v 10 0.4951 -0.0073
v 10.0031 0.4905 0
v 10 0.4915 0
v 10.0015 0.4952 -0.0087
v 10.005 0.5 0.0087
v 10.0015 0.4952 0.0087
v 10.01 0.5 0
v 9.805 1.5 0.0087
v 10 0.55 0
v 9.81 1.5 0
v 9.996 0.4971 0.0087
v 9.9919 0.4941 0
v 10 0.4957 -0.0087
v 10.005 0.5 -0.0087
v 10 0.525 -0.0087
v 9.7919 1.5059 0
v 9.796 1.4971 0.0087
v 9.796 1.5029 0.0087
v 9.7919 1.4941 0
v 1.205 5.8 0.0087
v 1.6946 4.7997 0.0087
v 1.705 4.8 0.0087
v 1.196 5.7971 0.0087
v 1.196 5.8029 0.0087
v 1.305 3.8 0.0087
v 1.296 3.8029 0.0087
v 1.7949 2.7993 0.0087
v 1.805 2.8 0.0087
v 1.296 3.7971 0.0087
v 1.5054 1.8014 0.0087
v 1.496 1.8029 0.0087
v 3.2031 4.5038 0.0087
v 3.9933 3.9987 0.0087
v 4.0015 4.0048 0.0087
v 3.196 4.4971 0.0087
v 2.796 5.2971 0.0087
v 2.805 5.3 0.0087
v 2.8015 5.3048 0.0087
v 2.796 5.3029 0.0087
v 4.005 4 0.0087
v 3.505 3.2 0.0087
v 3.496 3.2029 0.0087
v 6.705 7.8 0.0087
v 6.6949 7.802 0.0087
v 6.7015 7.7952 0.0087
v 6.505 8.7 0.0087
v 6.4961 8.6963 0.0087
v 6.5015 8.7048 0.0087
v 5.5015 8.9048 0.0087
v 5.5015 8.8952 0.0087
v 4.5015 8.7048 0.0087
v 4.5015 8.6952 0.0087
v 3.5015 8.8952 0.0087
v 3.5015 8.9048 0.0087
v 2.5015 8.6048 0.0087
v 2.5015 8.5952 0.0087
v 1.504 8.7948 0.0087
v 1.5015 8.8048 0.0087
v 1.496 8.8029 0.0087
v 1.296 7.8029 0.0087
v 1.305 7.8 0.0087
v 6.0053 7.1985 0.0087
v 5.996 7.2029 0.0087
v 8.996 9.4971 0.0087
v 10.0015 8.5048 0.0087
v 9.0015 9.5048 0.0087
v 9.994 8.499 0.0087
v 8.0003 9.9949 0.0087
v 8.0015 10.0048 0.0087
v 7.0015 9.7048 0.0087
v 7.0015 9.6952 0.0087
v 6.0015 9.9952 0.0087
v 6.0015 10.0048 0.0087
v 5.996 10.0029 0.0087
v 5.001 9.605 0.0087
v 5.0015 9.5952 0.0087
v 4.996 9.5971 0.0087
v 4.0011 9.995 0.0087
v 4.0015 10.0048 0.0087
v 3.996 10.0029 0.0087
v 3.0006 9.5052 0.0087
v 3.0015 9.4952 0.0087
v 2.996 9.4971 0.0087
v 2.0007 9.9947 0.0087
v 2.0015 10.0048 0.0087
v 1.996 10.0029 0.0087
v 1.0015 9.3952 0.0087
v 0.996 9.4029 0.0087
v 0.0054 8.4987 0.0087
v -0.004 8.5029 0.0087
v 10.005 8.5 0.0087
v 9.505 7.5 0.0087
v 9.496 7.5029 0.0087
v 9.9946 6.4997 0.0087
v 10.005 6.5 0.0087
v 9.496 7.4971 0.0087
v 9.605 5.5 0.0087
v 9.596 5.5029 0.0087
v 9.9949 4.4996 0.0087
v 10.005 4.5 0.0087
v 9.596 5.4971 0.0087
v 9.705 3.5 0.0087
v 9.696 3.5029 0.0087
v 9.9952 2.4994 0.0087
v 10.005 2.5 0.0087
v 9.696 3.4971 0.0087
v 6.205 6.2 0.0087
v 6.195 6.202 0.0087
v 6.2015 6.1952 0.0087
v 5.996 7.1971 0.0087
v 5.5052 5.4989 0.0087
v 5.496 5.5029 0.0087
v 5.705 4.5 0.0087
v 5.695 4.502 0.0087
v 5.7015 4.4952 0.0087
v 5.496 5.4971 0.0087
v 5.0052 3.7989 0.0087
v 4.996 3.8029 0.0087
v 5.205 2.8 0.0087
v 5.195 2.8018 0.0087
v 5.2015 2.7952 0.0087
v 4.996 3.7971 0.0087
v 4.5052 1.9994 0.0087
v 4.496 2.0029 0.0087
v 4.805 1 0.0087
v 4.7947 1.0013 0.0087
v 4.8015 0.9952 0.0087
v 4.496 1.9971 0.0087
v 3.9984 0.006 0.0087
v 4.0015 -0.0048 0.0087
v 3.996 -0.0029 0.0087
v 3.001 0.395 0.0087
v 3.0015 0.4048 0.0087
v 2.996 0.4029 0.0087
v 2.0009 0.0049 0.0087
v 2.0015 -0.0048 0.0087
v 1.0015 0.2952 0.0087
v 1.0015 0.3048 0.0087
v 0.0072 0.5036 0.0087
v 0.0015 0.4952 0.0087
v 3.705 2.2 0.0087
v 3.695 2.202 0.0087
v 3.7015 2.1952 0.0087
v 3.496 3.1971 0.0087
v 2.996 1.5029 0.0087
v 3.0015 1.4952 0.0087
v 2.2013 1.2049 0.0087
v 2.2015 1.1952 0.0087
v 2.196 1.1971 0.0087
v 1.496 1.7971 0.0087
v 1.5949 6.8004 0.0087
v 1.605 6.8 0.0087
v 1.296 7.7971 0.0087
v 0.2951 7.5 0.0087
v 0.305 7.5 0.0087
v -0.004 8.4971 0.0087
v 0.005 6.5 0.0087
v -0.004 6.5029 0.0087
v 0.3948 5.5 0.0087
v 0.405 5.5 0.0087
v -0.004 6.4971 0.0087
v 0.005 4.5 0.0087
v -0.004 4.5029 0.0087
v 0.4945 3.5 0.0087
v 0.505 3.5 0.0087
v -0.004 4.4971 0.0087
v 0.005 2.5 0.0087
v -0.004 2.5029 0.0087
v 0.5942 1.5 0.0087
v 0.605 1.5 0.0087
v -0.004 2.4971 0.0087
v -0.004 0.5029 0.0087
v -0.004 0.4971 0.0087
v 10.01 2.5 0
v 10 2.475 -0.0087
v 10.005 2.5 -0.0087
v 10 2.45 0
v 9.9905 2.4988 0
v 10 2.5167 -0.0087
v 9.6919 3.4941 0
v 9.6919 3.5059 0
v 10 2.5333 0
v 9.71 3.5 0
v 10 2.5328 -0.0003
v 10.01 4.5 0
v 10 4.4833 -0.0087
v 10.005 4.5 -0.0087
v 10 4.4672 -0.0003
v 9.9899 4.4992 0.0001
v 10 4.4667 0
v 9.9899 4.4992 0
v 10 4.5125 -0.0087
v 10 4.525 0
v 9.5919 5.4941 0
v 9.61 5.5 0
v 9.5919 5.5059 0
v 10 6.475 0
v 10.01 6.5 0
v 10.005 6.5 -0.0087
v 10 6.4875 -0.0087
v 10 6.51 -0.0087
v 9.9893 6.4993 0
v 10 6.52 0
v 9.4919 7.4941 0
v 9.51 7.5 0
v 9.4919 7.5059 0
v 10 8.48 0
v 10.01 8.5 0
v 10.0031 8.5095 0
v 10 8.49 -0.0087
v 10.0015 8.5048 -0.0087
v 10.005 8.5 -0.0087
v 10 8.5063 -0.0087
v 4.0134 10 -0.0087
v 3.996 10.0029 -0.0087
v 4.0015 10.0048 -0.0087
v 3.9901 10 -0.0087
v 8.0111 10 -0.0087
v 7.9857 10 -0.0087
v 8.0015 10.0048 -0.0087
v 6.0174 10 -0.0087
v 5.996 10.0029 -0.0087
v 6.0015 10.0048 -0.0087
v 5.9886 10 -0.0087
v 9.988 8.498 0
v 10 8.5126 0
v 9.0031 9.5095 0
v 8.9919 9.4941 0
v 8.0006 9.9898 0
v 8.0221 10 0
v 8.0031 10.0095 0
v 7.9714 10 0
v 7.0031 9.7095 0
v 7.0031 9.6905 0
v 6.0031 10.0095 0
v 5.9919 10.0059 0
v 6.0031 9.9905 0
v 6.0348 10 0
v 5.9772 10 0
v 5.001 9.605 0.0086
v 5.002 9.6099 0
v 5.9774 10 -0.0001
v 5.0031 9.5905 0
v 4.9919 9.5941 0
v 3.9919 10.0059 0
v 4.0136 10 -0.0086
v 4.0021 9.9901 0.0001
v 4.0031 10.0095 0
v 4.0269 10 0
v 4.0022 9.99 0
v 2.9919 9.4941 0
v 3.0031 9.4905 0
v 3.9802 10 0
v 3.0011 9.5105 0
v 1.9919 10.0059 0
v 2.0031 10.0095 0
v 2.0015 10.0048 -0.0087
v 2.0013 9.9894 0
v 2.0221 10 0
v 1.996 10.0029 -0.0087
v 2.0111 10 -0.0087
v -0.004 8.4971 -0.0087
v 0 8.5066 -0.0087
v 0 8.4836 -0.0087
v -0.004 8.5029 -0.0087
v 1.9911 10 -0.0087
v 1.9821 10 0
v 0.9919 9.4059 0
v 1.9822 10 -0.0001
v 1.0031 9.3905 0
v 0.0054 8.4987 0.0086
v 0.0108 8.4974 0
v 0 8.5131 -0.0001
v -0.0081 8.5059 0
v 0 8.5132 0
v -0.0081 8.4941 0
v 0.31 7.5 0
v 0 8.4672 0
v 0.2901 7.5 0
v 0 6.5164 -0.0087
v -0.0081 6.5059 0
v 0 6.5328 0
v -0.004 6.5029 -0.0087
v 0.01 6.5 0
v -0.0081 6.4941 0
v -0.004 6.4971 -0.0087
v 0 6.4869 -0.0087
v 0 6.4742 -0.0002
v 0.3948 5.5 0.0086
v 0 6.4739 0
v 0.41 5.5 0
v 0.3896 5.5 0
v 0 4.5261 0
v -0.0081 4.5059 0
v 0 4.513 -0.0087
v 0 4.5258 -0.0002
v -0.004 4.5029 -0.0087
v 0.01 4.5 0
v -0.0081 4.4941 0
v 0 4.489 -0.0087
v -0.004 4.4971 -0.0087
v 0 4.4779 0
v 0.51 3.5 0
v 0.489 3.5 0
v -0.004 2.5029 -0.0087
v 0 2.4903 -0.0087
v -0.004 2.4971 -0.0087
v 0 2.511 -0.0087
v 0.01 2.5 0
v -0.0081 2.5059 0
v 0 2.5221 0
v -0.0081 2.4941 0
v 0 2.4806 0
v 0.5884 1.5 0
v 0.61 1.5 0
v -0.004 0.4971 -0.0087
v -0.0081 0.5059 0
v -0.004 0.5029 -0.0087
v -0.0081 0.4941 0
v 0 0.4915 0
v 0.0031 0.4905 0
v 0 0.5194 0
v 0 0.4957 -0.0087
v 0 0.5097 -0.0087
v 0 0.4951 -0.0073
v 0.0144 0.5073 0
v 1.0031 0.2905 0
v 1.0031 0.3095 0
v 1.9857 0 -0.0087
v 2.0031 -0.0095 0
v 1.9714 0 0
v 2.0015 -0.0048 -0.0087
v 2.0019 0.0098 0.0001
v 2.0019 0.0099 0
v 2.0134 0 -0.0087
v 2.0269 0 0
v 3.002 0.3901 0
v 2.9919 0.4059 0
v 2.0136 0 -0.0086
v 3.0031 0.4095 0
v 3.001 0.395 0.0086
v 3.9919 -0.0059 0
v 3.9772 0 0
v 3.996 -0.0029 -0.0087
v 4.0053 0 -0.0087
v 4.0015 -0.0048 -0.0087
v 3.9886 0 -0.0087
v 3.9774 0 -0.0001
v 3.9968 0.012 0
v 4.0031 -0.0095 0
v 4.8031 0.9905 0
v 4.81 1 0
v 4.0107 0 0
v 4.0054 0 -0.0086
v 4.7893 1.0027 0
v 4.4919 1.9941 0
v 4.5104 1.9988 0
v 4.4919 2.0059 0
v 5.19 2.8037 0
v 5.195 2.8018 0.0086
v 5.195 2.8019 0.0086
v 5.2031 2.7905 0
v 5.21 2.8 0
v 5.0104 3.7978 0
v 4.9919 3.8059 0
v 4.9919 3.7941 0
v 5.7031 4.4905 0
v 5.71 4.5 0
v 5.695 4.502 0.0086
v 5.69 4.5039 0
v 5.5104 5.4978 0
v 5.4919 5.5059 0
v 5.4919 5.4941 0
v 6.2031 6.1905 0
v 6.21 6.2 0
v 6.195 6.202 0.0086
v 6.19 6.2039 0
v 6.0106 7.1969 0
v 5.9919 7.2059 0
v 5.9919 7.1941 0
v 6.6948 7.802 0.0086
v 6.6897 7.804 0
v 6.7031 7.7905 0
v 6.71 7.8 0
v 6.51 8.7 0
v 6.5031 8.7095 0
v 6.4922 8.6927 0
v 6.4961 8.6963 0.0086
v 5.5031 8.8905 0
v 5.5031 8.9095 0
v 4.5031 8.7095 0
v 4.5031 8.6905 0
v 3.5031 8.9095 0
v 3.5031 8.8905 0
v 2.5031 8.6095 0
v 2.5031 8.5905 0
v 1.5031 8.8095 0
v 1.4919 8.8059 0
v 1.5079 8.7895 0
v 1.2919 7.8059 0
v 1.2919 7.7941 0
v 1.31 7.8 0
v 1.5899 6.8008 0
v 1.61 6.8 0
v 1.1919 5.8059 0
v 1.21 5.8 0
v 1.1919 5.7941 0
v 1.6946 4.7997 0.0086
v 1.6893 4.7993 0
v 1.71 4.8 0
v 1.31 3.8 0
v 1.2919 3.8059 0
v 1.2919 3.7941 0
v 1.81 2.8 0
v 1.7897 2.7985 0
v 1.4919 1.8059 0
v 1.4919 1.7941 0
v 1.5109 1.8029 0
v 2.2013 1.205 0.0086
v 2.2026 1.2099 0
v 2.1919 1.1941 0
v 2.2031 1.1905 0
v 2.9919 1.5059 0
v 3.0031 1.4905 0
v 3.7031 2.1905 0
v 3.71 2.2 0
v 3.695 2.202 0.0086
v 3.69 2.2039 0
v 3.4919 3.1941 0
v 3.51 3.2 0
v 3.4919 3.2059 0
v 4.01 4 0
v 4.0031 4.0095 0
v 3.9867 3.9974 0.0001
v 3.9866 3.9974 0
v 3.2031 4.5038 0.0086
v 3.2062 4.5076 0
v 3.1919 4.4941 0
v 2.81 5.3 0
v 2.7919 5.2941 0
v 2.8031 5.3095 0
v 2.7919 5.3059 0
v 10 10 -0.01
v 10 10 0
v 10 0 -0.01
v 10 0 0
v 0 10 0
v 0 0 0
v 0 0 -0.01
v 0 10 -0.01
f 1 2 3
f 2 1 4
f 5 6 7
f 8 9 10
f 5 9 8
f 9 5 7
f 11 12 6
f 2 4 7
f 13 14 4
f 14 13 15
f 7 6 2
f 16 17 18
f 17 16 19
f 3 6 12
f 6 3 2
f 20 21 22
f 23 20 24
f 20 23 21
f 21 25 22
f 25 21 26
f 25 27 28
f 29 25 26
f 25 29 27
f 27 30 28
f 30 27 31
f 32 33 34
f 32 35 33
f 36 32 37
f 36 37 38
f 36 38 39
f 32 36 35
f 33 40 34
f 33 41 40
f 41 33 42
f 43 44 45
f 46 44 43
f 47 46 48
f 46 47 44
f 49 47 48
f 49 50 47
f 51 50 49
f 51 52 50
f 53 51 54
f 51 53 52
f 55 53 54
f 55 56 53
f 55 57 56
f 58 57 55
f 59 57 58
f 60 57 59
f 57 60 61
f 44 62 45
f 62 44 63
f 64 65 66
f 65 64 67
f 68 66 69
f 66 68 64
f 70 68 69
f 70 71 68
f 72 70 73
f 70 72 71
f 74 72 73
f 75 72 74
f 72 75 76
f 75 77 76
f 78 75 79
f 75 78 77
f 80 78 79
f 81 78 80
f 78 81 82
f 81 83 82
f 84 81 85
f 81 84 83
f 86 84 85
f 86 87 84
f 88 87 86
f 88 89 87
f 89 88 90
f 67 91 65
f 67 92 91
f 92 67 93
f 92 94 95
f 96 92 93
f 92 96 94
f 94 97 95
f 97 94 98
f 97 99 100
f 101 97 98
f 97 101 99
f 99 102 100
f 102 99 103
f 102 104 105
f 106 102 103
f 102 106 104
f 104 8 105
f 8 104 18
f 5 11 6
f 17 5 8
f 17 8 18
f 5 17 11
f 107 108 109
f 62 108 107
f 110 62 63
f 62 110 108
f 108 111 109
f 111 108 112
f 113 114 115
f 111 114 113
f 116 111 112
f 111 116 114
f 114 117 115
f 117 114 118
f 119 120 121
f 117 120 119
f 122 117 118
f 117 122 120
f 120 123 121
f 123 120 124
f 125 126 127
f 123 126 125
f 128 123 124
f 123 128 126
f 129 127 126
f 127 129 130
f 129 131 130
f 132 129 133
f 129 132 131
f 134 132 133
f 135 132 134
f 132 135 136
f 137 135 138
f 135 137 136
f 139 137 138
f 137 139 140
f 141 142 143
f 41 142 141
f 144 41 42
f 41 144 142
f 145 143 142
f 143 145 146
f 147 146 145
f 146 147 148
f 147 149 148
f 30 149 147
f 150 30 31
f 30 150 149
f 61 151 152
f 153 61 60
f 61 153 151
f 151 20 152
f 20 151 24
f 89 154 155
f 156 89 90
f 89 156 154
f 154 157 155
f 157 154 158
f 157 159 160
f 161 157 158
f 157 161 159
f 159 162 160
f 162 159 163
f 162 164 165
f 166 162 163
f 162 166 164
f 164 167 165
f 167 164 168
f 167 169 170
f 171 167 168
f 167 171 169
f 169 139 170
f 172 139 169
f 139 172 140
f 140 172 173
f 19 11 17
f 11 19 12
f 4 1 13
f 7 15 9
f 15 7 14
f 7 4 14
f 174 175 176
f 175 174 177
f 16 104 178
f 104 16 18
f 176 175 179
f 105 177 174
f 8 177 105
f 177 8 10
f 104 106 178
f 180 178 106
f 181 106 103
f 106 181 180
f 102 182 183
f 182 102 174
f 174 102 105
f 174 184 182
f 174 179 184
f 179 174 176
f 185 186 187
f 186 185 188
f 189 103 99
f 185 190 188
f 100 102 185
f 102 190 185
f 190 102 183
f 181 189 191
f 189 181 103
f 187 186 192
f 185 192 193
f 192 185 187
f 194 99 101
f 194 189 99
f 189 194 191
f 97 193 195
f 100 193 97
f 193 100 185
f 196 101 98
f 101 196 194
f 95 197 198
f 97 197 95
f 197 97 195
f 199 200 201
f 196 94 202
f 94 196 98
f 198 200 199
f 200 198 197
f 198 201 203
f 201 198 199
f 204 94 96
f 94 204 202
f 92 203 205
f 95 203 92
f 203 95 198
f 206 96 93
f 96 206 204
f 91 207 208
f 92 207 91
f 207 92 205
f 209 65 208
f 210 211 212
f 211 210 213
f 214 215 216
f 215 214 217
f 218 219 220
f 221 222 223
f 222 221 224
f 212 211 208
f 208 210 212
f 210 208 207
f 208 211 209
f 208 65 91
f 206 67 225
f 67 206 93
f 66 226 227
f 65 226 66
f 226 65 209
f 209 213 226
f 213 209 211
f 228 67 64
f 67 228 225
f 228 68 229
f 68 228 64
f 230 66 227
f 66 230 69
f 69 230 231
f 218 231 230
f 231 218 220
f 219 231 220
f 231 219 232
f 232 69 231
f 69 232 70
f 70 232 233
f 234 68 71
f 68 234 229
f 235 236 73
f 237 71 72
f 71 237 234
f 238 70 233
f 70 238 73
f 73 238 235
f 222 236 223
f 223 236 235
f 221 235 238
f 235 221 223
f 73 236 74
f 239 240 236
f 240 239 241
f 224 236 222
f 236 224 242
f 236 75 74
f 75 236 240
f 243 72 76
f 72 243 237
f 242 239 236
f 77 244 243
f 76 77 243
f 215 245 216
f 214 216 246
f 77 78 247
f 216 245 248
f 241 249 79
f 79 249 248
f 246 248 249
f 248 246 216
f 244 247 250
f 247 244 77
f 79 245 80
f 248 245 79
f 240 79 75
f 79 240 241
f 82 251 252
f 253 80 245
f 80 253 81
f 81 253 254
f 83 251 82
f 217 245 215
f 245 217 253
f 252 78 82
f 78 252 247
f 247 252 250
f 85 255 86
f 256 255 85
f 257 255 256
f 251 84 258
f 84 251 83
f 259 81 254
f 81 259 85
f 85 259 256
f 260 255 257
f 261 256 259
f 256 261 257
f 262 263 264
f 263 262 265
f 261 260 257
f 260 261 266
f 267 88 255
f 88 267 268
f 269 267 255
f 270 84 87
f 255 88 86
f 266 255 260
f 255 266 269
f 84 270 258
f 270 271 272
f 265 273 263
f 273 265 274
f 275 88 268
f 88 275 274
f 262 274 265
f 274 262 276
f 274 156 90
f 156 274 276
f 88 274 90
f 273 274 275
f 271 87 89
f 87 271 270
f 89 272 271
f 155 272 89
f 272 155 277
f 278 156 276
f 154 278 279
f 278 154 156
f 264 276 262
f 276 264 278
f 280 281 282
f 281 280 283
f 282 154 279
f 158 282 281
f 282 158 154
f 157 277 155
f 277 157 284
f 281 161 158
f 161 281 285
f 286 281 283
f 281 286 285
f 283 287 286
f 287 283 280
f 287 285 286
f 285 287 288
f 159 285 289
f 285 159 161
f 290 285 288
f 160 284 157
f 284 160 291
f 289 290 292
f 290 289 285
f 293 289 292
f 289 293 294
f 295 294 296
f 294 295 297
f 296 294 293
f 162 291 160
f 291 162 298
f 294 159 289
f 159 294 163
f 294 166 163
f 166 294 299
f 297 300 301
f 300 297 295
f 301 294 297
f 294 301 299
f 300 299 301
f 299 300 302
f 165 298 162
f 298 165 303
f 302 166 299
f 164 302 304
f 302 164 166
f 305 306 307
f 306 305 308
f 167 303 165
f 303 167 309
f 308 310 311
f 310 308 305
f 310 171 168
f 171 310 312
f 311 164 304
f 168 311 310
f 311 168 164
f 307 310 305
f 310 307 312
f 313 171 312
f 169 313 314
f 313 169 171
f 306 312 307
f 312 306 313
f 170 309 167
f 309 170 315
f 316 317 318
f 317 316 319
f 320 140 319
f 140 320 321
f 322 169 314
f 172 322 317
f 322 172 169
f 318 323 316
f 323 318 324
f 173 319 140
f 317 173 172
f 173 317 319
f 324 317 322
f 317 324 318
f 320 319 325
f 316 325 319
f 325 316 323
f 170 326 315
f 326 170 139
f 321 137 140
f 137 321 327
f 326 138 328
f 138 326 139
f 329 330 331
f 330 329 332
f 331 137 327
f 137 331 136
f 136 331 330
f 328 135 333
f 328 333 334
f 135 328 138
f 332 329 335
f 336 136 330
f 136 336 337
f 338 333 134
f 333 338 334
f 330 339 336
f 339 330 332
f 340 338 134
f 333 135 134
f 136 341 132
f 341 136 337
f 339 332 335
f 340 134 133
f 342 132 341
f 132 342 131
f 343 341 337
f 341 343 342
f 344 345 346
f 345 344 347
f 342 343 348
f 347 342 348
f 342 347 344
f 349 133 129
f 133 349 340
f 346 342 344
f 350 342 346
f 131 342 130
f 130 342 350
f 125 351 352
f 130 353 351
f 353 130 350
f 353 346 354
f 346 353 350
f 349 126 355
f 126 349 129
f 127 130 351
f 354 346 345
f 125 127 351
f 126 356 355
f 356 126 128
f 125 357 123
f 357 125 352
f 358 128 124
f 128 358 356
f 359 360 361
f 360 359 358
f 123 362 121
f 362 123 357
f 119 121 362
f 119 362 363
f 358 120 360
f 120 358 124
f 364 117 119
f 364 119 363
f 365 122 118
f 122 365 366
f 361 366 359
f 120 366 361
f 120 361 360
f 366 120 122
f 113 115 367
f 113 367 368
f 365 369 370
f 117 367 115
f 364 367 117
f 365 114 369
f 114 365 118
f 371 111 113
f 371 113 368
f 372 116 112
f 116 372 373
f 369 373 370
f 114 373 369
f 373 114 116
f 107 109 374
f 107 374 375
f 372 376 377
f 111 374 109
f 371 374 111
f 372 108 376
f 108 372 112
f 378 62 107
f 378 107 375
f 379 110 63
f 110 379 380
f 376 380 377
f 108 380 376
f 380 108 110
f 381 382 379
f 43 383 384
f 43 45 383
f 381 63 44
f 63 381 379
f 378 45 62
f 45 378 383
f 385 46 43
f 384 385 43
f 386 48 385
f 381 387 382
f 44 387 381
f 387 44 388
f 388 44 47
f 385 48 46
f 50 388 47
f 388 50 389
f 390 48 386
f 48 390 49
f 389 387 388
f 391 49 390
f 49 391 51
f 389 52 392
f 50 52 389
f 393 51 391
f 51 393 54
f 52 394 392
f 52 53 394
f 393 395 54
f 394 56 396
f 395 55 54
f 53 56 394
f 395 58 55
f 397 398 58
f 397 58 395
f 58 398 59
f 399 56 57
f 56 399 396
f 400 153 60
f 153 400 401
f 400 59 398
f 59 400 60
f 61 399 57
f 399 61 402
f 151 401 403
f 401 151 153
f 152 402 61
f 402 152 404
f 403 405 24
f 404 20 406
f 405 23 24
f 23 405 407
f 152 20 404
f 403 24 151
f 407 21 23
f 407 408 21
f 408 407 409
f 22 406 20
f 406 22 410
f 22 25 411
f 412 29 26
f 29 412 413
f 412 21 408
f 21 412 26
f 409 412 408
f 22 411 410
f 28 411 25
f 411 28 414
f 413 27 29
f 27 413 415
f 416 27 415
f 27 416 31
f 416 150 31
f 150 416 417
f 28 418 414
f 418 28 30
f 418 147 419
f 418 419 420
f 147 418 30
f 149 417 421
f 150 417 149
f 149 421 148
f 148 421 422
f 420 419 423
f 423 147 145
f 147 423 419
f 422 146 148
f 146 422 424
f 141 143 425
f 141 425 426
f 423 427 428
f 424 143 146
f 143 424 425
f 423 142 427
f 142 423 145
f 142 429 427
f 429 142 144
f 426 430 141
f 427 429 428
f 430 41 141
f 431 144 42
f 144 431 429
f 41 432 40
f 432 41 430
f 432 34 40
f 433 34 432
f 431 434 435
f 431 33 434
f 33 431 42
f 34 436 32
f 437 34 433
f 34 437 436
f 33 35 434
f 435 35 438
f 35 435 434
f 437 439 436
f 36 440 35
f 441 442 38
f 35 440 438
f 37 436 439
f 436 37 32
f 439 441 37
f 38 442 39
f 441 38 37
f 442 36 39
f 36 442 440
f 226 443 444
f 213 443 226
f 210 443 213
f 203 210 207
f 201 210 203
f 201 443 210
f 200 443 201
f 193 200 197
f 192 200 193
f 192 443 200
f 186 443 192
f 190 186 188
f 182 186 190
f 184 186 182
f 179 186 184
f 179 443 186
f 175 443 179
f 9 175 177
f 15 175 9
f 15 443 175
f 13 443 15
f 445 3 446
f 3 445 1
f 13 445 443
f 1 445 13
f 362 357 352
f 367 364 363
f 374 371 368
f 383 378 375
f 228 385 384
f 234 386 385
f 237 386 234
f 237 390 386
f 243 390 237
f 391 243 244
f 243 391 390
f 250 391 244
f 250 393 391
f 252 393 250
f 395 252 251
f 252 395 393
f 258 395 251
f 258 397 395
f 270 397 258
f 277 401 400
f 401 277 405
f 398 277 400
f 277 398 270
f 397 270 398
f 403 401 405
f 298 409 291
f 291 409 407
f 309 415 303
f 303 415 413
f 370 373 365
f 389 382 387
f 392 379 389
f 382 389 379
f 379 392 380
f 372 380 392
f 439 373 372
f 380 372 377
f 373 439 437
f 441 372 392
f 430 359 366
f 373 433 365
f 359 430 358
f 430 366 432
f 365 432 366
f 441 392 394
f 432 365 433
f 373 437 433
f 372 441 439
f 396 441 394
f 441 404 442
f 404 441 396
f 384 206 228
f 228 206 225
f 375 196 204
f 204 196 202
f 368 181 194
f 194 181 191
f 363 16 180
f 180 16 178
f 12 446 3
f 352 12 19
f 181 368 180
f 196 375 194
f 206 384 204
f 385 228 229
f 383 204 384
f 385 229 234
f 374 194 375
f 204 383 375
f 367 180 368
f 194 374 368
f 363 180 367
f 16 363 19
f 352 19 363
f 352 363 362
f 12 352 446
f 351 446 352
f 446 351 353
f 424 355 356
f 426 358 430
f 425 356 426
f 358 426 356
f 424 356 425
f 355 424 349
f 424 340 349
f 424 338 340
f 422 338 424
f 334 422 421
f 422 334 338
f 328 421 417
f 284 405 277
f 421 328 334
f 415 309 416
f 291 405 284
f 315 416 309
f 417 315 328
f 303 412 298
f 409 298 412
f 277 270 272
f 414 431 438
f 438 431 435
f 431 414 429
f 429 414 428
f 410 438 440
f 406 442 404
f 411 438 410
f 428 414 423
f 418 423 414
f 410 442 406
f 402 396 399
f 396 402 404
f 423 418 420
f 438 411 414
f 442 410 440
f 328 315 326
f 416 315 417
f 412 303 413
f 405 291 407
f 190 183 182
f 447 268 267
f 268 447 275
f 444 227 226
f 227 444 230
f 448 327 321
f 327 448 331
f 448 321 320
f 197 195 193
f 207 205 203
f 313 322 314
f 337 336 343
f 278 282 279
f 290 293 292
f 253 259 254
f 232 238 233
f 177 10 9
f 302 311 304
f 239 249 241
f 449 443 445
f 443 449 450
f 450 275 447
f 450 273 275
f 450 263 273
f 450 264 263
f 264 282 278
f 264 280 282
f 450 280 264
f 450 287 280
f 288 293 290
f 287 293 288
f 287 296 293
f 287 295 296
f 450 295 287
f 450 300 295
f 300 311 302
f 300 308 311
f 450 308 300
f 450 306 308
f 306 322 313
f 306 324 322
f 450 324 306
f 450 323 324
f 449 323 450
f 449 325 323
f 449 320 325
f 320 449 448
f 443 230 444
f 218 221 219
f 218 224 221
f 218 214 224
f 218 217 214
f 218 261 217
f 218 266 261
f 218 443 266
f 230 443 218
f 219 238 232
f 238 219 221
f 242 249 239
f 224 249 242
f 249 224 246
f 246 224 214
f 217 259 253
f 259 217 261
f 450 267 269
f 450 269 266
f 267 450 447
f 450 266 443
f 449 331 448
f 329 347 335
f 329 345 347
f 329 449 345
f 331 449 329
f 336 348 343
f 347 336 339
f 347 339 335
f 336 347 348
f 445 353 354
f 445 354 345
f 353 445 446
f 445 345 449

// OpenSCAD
hull(){
    translate([10, 0.5]) sphere(0.01);
    translate([9.8, 1.5]) sphere(0.01);
}
hull(){
    translate([9.8, 1.5]) sphere(0.01);
    translate([10, 2.5]) sphere(0.01);
}
hull(){
    translate([10, 2.5]) sphere(0.01);
    translate([9.7, 3.5]) sphere(0.01);
}
hull(){
    translate([9.7, 3.5]) sphere(0.01);
    translate([10, 4.5]) sphere(0.01);
}
hull(){
    translate([10, 4.5]) sphere(0.01);
    translate([9.6, 5.5]) sphere(0.01);
}
hull(){
    translate([9.6, 5.5]) sphere(0.01);
    translate([10, 6.5]) sphere(0.01);
}
hull(){
    translate([10, 6.5]) sphere(0.01);
    translate([9.5, 7.5]) sphere(0.01);
}
hull(){
    translate([9.5, 7.5]) sphere(0.01);
    translate([10, 8.5]) sphere(0.01);
}
hull(){
    translate([10, 8.5]) sphere(0.01);
    translate([9, 9.5]) sphere(0.01);
}
hull(){
    translate([9, 9.5]) sphere(0.01);
    translate([8, 10]) sphere(0.01);
}
hull(){
    translate([8, 10]) sphere(0.01);
    translate([7, 9.7]) sphere(0.01);
}
hull(){
    translate([7, 9.7]) sphere(0.01);
    translate([6, 10]) sphere(0.01);
}
hull(){
    translate([6, 10]) sphere(0.01);
    translate([5, 9.6]) sphere(0.01);
}
hull(){
    translate([5, 9.6]) sphere(0.01);
    translate([4, 10]) sphere(0.01);
}
hull(){
    translate([4, 10]) sphere(0.01);
    translate([3, 9.5]) sphere(0.01);
}
hull(){
    translate([3, 9.5]) sphere(0.01);
    translate([2, 10]) sphere(0.01);
}
hull(){
    translate([2, 10]) sphere(0.01);
    translate([1, 9.4]) sphere(0.01);
}
hull(){
    translate([1, 9.4]) sphere(0.01);
    translate([0, 8.5]) sphere(0.01);
}
hull(){
    translate([0, 8.5]) sphere(0.01);
    translate([0.3, 7.5]) sphere(0.01);
}
hull(){
    translate([0.3, 7.5]) sphere(0.01);
    translate([0, 6.5]) sphere(0.01);
}
hull(){
    translate([0, 6.5]) sphere(0.01);
    translate([0.4, 5.5]) sphere(0.01);
}
hull(){
    translate([0.4, 5.5]) sphere(0.01);
    translate([0, 4.5]) sphere(0.01);
}
hull(){
    translate([0, 4.5]) sphere(0.01);
    translate([0.5, 3.5]) sphere(0.01);
}
hull(){
    translate([0.5, 3.5]) sphere(0.01);
    translate([0, 2.5]) sphere(0.01);
}
hull(){
    translate([0, 2.5]) sphere(0.01);
    translate([0.6, 1.5]) sphere(0.01);
}
hull(){
    translate([0.6, 1.5]) sphere(0.01);
    translate([0, 0.5]) sphere(0.01);
}
hull(){
    translate([0, 0.5]) sphere(0.01);
    translate([1, 0.3]) sphere(0.01);
}
hull(){
    translate([1, 0.3]) sphere(0.01);
    translate([2, 0]) sphere(0.01);
}
hull(){
    translate([2, 0]) sphere(0.01);
    translate([3, 0.4]) sphere(0.01);
}
hull(){
    translate([3, 0.4]) sphere(0.01);
    translate([4, 0]) sphere(0.01);
}
hull(){
    translate([4, 0]) sphere(0.01);
    translate([4.8, 1]) sphere(0.01);
}
hull(){
    translate([4.8, 1]) sphere(0.01);
    translate([4.5, 2]) sphere(0.01);
}
hull(){
    translate([4.5, 2]) sphere(0.01);
    translate([5.2, 2.8]) sphere(0.01);
}
hull(){
    translate([5.2, 2.8]) sphere(0.01);
    translate([5, 3.8]) sphere(0.01);
}
hull(){
    translate([5, 3.8]) sphere(0.01);
    translate([5.7, 4.5]) sphere(0.01);
}
hull(){
    translate([5.7, 4.5]) sphere(0.01);
    translate([5.5, 5.5]) sphere(0.01);
}
hull(){
    translate([5.5, 5.5]) sphere(0.01);
    translate([6.2, 6.2]) sphere(0.01);
}
hull(){
    translate([6.2, 6.2]) sphere(0.01);
    translate([6, 7.2]) sphere(0.01);
}
hull(){
    translate([6, 7.2]) sphere(0.01);
    translate([6.7, 7.8]) sphere(0.01);
}
hull(){
    translate([6.7, 7.8]) sphere(0.01);
    translate([6.5, 8.7]) sphere(0.01);
}
hull(){
    translate([6.5, 8.7]) sphere(0.01);
    translate([5.5, 8.9]) sphere(0.01);
}
hull(){
    translate([5.5, 8.9]) sphere(0.01);
    translate([4.5, 8.7]) sphere(0.01);
}
hull(){
    translate([4.5, 8.7]) sphere(0.01);
    translate([3.5, 8.9]) sphere(0.01);
}
hull(){
    translate([3.5, 8.9]) sphere(0.01);
    translate([2.5, 8.6]) sphere(0.01);
}
hull(){
    translate([2.5, 8.6]) sphere(0.01);
    translate([1.5, 8.8]) sphere(0.01);
}
hull(){
    translate([1.5, 8.8]) sphere(0.01);
    translate([1.3, 7.8]) sphere(0.01);
}
hull(){
    translate([1.3, 7.8]) sphere(0.01);
    translate([1.6, 6.8]) sphere(0.01);
}
hull(){
    translate([1.6, 6.8]) sphere(0.01);
    translate([1.2, 5.8]) sphere(0.01);
}
hull(){
    translate([1.2, 5.8]) sphere(0.01);
    translate([1.7, 4.8]) sphere(0.01);
}
hull(){
    translate([1.7, 4.8]) sphere(0.01);
    translate([1.3, 3.8]) sphere(0.01);
}
hull(){
    translate([1.3, 3.8]) sphere(0.01);
    translate([1.8, 2.8]) sphere(0.01);
}
hull(){
    translate([1.8, 2.8]) sphere(0.01);
    translate([1.5, 1.8]) sphere(0.01);
}
hull(){
    translate([1.5, 1.8]) sphere(0.01);
    translate([2.2, 1.2]) sphere(0.01);
}
hull(){
    translate([2.2, 1.2]) sphere(0.01);
    translate([3, 1.5]) sphere(0.01);
}
hull(){
    translate([3, 1.5]) sphere(0.01);
    translate([3.7, 2.2]) sphere(0.01);
}
hull(){
    translate([3.7, 2.2]) sphere(0.01);
    translate([3.5, 3.2]) sphere(0.01);
}
hull(){
    translate([3.5, 3.2]) sphere(0.01);
    translate([4, 4]) sphere(0.01);
}
hull(){
    translate([4, 4]) sphere(0.01);
    translate([3.2, 4.5]) sphere(0.01);
}
hull(){
    translate([3.2, 4.5]) sphere(0.01);
    translate([2.8, 5.3]) sphere(0.01);
}
translate([0,0,-0.01]) color([0.1,0.1,0.1]) cube([10,10,0.01]);
